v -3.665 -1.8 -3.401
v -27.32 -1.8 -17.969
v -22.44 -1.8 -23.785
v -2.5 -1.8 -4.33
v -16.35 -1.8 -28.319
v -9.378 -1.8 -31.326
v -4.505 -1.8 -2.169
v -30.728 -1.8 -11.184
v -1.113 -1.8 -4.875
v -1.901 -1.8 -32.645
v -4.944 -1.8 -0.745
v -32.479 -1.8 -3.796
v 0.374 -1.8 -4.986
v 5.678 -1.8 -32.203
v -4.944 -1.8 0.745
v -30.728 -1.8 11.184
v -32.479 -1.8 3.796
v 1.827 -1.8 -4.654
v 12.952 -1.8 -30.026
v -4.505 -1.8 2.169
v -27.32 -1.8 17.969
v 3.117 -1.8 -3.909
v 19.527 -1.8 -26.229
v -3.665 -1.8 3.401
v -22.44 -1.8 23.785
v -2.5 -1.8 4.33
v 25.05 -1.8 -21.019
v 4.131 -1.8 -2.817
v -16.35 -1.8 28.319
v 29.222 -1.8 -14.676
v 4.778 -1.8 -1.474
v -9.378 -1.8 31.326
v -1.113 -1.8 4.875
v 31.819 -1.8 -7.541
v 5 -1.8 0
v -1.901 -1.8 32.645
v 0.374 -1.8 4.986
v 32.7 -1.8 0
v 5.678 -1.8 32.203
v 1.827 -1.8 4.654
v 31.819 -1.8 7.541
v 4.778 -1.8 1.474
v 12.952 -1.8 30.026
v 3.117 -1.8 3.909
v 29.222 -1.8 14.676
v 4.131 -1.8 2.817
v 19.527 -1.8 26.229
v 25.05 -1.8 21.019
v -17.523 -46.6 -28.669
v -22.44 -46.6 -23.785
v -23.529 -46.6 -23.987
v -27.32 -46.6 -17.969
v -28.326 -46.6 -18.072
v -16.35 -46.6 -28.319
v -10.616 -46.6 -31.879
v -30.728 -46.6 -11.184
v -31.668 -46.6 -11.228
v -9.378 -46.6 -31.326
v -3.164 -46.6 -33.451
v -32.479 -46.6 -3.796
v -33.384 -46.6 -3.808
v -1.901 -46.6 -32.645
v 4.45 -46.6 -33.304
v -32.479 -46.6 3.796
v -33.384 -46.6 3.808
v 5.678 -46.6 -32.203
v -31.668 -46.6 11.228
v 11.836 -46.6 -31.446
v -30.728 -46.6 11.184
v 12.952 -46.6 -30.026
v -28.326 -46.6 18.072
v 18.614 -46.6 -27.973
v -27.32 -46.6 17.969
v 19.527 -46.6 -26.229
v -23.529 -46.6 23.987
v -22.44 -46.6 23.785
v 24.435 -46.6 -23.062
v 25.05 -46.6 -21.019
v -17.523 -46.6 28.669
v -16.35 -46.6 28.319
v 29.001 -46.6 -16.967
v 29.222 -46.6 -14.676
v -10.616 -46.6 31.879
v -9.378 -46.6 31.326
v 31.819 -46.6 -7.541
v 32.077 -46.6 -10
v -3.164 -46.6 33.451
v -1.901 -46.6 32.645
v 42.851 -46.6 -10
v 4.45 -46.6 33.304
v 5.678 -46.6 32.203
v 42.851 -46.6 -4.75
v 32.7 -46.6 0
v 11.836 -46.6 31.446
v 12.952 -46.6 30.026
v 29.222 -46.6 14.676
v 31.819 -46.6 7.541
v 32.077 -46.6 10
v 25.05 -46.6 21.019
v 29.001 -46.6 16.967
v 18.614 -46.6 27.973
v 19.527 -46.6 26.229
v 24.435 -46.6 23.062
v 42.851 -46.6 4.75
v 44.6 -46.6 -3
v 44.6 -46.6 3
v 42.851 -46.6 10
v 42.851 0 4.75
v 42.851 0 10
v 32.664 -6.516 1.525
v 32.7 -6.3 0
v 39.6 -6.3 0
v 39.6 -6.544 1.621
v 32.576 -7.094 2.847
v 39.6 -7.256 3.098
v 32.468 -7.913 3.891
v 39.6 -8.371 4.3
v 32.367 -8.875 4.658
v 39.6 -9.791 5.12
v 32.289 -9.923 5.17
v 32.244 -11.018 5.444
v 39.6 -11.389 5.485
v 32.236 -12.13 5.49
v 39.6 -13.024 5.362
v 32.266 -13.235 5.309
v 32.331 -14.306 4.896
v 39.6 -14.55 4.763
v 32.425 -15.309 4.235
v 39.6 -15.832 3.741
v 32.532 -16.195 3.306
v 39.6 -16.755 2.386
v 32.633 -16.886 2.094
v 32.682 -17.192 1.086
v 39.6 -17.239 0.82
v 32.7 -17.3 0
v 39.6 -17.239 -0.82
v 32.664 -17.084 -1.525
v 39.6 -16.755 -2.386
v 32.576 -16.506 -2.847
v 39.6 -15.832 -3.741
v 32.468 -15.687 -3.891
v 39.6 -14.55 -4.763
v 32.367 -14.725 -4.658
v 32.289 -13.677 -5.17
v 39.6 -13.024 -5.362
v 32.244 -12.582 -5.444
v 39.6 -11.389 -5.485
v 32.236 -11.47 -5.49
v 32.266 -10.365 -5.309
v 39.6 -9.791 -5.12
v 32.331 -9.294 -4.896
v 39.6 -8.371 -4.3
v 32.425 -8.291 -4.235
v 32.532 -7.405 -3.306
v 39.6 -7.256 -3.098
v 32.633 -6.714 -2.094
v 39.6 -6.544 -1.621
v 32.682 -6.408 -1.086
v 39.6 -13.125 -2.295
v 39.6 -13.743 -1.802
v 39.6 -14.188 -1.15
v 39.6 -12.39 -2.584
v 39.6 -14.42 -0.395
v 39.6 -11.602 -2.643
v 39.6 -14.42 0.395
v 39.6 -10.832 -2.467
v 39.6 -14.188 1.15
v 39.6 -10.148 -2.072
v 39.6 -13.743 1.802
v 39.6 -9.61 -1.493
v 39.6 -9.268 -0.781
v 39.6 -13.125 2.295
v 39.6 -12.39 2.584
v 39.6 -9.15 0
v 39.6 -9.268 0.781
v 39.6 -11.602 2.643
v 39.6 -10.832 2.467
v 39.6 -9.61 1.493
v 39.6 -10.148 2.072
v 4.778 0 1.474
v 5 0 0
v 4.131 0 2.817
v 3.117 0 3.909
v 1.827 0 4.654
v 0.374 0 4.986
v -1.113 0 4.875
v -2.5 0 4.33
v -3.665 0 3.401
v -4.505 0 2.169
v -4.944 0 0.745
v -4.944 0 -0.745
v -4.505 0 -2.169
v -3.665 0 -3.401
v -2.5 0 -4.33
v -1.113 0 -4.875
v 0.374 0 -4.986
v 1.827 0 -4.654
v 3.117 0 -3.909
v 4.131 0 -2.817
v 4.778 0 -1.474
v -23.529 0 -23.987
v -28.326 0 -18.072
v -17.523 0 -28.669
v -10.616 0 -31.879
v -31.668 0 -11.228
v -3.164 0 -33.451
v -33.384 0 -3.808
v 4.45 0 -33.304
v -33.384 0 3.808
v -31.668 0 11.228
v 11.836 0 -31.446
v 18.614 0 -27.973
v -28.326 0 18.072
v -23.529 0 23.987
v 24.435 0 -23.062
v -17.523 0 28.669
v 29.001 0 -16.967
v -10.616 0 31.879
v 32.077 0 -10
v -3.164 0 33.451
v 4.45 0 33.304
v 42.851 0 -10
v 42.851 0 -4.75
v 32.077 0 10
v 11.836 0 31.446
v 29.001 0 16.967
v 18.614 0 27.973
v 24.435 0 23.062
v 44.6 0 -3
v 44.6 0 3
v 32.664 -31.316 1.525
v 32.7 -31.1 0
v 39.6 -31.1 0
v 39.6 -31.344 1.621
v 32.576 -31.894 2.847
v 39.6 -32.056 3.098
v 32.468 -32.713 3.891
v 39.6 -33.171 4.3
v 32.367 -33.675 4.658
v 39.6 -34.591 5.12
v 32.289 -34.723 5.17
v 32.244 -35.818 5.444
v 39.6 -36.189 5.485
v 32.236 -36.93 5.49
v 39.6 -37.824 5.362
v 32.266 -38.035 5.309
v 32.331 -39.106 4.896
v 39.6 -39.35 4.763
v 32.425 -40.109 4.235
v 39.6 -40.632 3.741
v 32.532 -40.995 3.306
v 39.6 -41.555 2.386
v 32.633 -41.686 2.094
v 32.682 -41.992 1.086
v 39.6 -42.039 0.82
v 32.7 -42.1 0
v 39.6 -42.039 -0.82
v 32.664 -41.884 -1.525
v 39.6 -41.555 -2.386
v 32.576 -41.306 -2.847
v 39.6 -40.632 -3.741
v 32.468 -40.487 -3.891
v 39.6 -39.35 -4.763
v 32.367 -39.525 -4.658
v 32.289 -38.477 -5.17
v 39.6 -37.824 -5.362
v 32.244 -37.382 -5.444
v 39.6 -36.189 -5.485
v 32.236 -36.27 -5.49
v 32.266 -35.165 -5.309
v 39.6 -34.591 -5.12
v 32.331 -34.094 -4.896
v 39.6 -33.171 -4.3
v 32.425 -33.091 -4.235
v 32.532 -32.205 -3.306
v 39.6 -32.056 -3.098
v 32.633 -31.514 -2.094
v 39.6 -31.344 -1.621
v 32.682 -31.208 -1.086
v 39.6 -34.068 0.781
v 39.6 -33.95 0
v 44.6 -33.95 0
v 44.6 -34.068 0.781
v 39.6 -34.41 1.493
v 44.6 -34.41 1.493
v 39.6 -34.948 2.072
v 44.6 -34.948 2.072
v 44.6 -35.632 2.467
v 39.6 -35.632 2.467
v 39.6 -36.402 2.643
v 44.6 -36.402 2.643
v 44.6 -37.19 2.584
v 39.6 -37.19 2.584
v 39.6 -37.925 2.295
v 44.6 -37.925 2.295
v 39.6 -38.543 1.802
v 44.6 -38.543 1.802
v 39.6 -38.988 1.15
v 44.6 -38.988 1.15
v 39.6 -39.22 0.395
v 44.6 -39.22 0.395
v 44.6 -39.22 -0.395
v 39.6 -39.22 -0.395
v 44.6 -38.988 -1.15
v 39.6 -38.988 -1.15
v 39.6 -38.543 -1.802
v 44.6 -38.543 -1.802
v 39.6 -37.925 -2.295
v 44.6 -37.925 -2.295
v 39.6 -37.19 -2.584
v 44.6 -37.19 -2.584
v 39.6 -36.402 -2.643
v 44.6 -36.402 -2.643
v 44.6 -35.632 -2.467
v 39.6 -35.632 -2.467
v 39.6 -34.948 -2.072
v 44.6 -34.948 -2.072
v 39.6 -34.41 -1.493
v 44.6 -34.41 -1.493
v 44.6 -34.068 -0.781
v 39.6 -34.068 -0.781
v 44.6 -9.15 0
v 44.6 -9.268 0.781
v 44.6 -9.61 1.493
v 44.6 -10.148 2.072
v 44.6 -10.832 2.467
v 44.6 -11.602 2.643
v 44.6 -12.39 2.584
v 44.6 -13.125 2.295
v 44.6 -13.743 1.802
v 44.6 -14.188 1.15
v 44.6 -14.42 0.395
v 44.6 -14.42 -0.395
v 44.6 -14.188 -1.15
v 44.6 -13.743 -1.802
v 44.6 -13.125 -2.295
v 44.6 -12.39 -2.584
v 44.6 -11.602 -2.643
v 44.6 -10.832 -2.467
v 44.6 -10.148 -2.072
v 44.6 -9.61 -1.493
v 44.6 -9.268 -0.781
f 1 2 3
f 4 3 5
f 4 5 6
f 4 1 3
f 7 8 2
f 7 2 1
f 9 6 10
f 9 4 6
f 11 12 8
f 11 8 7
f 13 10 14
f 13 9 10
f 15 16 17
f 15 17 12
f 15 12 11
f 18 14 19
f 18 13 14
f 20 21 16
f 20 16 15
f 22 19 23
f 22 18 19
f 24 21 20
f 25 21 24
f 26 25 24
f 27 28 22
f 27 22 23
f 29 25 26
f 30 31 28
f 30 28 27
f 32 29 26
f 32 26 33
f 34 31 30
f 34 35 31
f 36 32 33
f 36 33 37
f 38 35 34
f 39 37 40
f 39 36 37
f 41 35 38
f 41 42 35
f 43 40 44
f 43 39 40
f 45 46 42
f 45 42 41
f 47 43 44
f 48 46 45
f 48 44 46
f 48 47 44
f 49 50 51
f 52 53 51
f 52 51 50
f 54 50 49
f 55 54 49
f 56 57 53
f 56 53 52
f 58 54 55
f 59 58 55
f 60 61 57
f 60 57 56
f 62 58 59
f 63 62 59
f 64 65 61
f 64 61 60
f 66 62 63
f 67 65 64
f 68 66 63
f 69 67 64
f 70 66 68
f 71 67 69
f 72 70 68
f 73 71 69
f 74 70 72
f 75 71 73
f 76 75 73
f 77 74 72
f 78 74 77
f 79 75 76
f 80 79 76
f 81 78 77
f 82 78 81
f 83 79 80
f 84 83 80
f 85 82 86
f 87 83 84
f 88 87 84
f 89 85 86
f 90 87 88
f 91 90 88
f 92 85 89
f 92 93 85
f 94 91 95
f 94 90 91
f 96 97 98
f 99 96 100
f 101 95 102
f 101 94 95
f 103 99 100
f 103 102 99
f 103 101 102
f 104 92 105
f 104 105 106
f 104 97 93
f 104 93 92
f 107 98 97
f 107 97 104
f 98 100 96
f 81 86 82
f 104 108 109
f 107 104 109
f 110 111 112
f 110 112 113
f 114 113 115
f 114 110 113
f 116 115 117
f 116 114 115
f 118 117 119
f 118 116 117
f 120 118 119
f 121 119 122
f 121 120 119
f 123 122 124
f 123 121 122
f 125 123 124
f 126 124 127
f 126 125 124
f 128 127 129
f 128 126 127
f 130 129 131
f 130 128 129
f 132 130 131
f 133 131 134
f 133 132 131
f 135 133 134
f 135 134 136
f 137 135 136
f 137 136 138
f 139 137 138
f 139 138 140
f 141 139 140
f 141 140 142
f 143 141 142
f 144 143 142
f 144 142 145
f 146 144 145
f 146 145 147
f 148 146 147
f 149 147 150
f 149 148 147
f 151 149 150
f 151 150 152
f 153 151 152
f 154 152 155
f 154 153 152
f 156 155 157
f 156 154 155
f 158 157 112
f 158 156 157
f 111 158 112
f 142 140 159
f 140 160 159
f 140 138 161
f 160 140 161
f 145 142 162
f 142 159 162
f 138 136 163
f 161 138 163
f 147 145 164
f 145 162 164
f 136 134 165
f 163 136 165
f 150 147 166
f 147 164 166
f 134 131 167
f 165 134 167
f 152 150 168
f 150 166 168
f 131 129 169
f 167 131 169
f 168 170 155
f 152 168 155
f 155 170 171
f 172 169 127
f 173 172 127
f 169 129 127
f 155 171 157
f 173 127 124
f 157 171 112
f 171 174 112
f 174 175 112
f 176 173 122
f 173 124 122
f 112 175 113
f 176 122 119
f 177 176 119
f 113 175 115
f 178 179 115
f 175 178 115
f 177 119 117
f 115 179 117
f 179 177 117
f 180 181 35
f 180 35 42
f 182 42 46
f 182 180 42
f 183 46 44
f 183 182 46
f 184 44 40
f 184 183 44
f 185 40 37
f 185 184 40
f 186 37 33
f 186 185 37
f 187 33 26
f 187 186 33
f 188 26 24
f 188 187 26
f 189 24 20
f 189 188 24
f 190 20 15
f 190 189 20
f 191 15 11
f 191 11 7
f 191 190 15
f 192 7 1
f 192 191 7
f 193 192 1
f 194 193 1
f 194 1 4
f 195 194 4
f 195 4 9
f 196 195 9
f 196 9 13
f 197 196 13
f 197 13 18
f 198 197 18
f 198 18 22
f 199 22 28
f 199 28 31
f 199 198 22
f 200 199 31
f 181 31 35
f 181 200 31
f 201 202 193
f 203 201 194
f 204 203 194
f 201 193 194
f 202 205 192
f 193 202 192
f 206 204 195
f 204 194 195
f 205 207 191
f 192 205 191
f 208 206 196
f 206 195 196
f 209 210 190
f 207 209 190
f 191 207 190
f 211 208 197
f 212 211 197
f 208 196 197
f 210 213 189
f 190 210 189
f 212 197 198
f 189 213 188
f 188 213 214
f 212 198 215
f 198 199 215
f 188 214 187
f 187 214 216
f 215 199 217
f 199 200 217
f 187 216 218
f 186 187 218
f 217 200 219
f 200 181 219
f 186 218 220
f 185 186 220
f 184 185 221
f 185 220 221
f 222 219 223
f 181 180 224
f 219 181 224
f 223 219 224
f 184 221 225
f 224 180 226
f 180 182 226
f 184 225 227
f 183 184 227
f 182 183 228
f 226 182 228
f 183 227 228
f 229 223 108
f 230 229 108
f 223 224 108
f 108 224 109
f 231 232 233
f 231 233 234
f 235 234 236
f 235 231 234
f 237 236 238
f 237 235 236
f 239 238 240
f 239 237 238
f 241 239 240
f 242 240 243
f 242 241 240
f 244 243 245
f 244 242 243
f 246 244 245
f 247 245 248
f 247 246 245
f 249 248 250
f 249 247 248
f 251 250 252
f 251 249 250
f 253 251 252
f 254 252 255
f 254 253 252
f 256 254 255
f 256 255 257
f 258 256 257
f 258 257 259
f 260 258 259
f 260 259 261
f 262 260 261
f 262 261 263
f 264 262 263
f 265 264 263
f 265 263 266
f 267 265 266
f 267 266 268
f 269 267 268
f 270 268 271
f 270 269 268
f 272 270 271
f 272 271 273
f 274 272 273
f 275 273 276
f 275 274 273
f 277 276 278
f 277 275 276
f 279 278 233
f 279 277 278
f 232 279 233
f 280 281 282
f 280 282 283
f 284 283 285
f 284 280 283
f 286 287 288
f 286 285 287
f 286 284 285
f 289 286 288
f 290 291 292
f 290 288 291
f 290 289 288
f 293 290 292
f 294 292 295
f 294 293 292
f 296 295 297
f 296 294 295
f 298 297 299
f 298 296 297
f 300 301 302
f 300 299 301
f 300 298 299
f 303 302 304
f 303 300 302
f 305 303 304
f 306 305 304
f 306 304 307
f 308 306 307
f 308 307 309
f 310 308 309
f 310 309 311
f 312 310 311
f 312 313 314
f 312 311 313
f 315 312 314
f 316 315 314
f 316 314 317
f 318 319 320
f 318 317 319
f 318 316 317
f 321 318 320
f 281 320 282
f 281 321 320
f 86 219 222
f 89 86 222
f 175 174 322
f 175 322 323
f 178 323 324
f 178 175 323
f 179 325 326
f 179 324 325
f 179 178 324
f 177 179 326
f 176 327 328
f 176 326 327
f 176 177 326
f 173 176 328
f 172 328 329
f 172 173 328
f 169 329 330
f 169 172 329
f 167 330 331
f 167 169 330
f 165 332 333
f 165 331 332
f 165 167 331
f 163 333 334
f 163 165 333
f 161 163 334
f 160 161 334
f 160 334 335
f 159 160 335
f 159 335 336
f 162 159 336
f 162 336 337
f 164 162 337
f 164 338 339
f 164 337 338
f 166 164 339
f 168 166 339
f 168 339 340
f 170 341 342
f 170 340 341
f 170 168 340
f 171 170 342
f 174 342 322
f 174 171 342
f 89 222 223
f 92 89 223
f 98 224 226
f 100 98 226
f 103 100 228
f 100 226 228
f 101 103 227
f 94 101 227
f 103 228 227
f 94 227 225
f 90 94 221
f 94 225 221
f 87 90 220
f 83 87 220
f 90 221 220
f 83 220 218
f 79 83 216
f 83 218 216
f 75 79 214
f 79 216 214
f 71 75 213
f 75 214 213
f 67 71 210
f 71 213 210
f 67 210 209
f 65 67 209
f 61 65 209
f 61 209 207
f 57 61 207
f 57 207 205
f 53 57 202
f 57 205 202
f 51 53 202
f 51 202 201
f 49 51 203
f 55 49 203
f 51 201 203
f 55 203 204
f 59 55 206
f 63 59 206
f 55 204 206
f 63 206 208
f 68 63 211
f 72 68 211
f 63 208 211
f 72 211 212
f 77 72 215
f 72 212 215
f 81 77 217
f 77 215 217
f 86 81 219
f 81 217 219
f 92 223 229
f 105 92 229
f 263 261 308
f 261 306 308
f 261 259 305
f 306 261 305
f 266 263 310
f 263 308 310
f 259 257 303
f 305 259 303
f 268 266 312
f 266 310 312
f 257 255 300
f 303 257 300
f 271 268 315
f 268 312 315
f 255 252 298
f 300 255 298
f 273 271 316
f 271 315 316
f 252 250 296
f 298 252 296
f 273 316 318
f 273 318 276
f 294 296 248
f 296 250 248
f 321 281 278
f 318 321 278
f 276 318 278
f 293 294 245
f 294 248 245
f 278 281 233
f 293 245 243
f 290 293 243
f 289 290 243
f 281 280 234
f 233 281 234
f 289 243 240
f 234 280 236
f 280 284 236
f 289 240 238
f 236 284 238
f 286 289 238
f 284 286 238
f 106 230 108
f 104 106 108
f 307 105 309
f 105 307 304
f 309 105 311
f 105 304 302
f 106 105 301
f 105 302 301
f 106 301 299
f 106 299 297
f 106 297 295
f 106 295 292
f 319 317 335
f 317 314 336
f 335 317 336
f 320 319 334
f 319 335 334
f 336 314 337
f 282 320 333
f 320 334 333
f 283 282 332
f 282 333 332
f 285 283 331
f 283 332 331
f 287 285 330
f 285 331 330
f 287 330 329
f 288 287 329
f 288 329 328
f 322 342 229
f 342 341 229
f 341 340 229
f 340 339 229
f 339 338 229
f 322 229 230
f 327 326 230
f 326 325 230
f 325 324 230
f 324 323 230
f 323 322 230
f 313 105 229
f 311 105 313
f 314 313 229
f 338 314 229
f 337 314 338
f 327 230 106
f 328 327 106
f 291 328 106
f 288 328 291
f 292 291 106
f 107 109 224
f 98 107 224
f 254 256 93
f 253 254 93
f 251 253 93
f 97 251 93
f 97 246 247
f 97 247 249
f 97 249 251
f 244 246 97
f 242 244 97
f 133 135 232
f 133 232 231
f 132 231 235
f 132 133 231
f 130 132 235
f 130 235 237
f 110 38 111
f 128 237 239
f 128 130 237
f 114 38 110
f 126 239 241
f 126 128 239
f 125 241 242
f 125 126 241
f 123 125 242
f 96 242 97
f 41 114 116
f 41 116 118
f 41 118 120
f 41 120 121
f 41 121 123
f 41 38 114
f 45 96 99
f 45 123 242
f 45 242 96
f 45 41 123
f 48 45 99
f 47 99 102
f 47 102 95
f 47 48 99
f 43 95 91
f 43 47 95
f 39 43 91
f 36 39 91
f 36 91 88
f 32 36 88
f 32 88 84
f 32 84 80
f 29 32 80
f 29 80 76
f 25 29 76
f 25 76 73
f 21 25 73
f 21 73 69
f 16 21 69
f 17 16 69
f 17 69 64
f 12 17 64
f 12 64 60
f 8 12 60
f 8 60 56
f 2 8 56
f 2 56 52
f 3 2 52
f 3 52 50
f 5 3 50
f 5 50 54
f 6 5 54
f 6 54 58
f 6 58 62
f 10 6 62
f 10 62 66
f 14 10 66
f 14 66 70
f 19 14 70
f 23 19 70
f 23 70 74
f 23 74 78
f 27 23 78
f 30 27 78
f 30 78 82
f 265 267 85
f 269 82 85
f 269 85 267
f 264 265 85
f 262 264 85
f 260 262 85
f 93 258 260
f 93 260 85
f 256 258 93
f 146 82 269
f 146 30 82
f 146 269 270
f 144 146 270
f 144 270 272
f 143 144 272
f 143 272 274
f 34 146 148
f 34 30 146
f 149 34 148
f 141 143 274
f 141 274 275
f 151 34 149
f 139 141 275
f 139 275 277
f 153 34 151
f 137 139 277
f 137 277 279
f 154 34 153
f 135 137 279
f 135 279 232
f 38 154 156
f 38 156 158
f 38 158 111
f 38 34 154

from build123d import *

# Parameters (mm, degrees)
F1_R     = 32.7
F1_R_2   = 5
F2_DEPTH = 1.8
F0_R     = 32.7
F3_DEPTH = 46.6
F4_R     = 2.65
F5_DEPTH = 44.601471
F6_R     = 5.5
F7_DEPTH = 39.6


with BuildPart() as f2:
    # F1 (on Front) → F2 (new body)
    with BuildSketch(Plane.XZ):
        Circle(F1_R)
        Circle(F1_R_2, mode=Mode.SUBTRACT)
    extrude(amount=F2_DEPTH)

    # F0 (on Front) → F3 (join)
    with BuildSketch(Plane.XZ):
        with BuildLine():
            ThreePointArc((32.077406, -10), (33.217171, -5.057625), (33.6, 0))
            ThreePointArc((33.6, 0), (33.217171, 5.057625), (32.077406, 10))
            ThreePointArc((32.077406, 10), (-33.6, 0), (32.077406, -10))
        make_face()
        Circle(F0_R, mode=Mode.SUBTRACT)
        with BuildLine():
            Line((42.851, 0), (33.6, 0))
            ThreePointArc((33.6, 0), (33.217171, -5.057625), (32.077406, -10))
            Line((32.077406, -10), (42.851, -10))
            Line((42.851, -10), (42.851, -4.75))
            Line((42.851, -4.75), (42.851, 0))
        make_face()
        with BuildLine():
            ThreePointArc((32.077406, 10), (33.217171, 5.057625), (33.6, 0))
            Line((33.6, 0), (42.851, 0))
            Line((42.851, 0), (42.851, 4.75))
            Line((42.851, 4.75), (42.851, 10))
            Line((42.851, 10), (32.077406, 10))
        make_face()
        Polygon((42.851, 4.75), (42.851, 0), (42.851, -4.75), (44.600471, -3), (44.600471, 3), align=None)
    extrude(amount=F3_DEPTH)

    # F4 (on Right) → F5 (cut, through all)
    with BuildSketch(Plane.YZ):
        with Locations((-11.8, 0)):
            Circle(F4_R)
        with Locations((-36.6, 0)):
            Circle(F4_R)
    extrude(amount=F5_DEPTH, mode=Mode.SUBTRACT)

    # F6 (on Right) → F7 (cut)
    with BuildSketch(Plane.YZ):
        with Locations((-11.8, 0)):
            Circle(F6_R)
        with Locations((-36.6, 0)):
            Circle(F6_R)
    extrude(amount=F7_DEPTH, mode=Mode.SUBTRACT)


solid = f2.part
